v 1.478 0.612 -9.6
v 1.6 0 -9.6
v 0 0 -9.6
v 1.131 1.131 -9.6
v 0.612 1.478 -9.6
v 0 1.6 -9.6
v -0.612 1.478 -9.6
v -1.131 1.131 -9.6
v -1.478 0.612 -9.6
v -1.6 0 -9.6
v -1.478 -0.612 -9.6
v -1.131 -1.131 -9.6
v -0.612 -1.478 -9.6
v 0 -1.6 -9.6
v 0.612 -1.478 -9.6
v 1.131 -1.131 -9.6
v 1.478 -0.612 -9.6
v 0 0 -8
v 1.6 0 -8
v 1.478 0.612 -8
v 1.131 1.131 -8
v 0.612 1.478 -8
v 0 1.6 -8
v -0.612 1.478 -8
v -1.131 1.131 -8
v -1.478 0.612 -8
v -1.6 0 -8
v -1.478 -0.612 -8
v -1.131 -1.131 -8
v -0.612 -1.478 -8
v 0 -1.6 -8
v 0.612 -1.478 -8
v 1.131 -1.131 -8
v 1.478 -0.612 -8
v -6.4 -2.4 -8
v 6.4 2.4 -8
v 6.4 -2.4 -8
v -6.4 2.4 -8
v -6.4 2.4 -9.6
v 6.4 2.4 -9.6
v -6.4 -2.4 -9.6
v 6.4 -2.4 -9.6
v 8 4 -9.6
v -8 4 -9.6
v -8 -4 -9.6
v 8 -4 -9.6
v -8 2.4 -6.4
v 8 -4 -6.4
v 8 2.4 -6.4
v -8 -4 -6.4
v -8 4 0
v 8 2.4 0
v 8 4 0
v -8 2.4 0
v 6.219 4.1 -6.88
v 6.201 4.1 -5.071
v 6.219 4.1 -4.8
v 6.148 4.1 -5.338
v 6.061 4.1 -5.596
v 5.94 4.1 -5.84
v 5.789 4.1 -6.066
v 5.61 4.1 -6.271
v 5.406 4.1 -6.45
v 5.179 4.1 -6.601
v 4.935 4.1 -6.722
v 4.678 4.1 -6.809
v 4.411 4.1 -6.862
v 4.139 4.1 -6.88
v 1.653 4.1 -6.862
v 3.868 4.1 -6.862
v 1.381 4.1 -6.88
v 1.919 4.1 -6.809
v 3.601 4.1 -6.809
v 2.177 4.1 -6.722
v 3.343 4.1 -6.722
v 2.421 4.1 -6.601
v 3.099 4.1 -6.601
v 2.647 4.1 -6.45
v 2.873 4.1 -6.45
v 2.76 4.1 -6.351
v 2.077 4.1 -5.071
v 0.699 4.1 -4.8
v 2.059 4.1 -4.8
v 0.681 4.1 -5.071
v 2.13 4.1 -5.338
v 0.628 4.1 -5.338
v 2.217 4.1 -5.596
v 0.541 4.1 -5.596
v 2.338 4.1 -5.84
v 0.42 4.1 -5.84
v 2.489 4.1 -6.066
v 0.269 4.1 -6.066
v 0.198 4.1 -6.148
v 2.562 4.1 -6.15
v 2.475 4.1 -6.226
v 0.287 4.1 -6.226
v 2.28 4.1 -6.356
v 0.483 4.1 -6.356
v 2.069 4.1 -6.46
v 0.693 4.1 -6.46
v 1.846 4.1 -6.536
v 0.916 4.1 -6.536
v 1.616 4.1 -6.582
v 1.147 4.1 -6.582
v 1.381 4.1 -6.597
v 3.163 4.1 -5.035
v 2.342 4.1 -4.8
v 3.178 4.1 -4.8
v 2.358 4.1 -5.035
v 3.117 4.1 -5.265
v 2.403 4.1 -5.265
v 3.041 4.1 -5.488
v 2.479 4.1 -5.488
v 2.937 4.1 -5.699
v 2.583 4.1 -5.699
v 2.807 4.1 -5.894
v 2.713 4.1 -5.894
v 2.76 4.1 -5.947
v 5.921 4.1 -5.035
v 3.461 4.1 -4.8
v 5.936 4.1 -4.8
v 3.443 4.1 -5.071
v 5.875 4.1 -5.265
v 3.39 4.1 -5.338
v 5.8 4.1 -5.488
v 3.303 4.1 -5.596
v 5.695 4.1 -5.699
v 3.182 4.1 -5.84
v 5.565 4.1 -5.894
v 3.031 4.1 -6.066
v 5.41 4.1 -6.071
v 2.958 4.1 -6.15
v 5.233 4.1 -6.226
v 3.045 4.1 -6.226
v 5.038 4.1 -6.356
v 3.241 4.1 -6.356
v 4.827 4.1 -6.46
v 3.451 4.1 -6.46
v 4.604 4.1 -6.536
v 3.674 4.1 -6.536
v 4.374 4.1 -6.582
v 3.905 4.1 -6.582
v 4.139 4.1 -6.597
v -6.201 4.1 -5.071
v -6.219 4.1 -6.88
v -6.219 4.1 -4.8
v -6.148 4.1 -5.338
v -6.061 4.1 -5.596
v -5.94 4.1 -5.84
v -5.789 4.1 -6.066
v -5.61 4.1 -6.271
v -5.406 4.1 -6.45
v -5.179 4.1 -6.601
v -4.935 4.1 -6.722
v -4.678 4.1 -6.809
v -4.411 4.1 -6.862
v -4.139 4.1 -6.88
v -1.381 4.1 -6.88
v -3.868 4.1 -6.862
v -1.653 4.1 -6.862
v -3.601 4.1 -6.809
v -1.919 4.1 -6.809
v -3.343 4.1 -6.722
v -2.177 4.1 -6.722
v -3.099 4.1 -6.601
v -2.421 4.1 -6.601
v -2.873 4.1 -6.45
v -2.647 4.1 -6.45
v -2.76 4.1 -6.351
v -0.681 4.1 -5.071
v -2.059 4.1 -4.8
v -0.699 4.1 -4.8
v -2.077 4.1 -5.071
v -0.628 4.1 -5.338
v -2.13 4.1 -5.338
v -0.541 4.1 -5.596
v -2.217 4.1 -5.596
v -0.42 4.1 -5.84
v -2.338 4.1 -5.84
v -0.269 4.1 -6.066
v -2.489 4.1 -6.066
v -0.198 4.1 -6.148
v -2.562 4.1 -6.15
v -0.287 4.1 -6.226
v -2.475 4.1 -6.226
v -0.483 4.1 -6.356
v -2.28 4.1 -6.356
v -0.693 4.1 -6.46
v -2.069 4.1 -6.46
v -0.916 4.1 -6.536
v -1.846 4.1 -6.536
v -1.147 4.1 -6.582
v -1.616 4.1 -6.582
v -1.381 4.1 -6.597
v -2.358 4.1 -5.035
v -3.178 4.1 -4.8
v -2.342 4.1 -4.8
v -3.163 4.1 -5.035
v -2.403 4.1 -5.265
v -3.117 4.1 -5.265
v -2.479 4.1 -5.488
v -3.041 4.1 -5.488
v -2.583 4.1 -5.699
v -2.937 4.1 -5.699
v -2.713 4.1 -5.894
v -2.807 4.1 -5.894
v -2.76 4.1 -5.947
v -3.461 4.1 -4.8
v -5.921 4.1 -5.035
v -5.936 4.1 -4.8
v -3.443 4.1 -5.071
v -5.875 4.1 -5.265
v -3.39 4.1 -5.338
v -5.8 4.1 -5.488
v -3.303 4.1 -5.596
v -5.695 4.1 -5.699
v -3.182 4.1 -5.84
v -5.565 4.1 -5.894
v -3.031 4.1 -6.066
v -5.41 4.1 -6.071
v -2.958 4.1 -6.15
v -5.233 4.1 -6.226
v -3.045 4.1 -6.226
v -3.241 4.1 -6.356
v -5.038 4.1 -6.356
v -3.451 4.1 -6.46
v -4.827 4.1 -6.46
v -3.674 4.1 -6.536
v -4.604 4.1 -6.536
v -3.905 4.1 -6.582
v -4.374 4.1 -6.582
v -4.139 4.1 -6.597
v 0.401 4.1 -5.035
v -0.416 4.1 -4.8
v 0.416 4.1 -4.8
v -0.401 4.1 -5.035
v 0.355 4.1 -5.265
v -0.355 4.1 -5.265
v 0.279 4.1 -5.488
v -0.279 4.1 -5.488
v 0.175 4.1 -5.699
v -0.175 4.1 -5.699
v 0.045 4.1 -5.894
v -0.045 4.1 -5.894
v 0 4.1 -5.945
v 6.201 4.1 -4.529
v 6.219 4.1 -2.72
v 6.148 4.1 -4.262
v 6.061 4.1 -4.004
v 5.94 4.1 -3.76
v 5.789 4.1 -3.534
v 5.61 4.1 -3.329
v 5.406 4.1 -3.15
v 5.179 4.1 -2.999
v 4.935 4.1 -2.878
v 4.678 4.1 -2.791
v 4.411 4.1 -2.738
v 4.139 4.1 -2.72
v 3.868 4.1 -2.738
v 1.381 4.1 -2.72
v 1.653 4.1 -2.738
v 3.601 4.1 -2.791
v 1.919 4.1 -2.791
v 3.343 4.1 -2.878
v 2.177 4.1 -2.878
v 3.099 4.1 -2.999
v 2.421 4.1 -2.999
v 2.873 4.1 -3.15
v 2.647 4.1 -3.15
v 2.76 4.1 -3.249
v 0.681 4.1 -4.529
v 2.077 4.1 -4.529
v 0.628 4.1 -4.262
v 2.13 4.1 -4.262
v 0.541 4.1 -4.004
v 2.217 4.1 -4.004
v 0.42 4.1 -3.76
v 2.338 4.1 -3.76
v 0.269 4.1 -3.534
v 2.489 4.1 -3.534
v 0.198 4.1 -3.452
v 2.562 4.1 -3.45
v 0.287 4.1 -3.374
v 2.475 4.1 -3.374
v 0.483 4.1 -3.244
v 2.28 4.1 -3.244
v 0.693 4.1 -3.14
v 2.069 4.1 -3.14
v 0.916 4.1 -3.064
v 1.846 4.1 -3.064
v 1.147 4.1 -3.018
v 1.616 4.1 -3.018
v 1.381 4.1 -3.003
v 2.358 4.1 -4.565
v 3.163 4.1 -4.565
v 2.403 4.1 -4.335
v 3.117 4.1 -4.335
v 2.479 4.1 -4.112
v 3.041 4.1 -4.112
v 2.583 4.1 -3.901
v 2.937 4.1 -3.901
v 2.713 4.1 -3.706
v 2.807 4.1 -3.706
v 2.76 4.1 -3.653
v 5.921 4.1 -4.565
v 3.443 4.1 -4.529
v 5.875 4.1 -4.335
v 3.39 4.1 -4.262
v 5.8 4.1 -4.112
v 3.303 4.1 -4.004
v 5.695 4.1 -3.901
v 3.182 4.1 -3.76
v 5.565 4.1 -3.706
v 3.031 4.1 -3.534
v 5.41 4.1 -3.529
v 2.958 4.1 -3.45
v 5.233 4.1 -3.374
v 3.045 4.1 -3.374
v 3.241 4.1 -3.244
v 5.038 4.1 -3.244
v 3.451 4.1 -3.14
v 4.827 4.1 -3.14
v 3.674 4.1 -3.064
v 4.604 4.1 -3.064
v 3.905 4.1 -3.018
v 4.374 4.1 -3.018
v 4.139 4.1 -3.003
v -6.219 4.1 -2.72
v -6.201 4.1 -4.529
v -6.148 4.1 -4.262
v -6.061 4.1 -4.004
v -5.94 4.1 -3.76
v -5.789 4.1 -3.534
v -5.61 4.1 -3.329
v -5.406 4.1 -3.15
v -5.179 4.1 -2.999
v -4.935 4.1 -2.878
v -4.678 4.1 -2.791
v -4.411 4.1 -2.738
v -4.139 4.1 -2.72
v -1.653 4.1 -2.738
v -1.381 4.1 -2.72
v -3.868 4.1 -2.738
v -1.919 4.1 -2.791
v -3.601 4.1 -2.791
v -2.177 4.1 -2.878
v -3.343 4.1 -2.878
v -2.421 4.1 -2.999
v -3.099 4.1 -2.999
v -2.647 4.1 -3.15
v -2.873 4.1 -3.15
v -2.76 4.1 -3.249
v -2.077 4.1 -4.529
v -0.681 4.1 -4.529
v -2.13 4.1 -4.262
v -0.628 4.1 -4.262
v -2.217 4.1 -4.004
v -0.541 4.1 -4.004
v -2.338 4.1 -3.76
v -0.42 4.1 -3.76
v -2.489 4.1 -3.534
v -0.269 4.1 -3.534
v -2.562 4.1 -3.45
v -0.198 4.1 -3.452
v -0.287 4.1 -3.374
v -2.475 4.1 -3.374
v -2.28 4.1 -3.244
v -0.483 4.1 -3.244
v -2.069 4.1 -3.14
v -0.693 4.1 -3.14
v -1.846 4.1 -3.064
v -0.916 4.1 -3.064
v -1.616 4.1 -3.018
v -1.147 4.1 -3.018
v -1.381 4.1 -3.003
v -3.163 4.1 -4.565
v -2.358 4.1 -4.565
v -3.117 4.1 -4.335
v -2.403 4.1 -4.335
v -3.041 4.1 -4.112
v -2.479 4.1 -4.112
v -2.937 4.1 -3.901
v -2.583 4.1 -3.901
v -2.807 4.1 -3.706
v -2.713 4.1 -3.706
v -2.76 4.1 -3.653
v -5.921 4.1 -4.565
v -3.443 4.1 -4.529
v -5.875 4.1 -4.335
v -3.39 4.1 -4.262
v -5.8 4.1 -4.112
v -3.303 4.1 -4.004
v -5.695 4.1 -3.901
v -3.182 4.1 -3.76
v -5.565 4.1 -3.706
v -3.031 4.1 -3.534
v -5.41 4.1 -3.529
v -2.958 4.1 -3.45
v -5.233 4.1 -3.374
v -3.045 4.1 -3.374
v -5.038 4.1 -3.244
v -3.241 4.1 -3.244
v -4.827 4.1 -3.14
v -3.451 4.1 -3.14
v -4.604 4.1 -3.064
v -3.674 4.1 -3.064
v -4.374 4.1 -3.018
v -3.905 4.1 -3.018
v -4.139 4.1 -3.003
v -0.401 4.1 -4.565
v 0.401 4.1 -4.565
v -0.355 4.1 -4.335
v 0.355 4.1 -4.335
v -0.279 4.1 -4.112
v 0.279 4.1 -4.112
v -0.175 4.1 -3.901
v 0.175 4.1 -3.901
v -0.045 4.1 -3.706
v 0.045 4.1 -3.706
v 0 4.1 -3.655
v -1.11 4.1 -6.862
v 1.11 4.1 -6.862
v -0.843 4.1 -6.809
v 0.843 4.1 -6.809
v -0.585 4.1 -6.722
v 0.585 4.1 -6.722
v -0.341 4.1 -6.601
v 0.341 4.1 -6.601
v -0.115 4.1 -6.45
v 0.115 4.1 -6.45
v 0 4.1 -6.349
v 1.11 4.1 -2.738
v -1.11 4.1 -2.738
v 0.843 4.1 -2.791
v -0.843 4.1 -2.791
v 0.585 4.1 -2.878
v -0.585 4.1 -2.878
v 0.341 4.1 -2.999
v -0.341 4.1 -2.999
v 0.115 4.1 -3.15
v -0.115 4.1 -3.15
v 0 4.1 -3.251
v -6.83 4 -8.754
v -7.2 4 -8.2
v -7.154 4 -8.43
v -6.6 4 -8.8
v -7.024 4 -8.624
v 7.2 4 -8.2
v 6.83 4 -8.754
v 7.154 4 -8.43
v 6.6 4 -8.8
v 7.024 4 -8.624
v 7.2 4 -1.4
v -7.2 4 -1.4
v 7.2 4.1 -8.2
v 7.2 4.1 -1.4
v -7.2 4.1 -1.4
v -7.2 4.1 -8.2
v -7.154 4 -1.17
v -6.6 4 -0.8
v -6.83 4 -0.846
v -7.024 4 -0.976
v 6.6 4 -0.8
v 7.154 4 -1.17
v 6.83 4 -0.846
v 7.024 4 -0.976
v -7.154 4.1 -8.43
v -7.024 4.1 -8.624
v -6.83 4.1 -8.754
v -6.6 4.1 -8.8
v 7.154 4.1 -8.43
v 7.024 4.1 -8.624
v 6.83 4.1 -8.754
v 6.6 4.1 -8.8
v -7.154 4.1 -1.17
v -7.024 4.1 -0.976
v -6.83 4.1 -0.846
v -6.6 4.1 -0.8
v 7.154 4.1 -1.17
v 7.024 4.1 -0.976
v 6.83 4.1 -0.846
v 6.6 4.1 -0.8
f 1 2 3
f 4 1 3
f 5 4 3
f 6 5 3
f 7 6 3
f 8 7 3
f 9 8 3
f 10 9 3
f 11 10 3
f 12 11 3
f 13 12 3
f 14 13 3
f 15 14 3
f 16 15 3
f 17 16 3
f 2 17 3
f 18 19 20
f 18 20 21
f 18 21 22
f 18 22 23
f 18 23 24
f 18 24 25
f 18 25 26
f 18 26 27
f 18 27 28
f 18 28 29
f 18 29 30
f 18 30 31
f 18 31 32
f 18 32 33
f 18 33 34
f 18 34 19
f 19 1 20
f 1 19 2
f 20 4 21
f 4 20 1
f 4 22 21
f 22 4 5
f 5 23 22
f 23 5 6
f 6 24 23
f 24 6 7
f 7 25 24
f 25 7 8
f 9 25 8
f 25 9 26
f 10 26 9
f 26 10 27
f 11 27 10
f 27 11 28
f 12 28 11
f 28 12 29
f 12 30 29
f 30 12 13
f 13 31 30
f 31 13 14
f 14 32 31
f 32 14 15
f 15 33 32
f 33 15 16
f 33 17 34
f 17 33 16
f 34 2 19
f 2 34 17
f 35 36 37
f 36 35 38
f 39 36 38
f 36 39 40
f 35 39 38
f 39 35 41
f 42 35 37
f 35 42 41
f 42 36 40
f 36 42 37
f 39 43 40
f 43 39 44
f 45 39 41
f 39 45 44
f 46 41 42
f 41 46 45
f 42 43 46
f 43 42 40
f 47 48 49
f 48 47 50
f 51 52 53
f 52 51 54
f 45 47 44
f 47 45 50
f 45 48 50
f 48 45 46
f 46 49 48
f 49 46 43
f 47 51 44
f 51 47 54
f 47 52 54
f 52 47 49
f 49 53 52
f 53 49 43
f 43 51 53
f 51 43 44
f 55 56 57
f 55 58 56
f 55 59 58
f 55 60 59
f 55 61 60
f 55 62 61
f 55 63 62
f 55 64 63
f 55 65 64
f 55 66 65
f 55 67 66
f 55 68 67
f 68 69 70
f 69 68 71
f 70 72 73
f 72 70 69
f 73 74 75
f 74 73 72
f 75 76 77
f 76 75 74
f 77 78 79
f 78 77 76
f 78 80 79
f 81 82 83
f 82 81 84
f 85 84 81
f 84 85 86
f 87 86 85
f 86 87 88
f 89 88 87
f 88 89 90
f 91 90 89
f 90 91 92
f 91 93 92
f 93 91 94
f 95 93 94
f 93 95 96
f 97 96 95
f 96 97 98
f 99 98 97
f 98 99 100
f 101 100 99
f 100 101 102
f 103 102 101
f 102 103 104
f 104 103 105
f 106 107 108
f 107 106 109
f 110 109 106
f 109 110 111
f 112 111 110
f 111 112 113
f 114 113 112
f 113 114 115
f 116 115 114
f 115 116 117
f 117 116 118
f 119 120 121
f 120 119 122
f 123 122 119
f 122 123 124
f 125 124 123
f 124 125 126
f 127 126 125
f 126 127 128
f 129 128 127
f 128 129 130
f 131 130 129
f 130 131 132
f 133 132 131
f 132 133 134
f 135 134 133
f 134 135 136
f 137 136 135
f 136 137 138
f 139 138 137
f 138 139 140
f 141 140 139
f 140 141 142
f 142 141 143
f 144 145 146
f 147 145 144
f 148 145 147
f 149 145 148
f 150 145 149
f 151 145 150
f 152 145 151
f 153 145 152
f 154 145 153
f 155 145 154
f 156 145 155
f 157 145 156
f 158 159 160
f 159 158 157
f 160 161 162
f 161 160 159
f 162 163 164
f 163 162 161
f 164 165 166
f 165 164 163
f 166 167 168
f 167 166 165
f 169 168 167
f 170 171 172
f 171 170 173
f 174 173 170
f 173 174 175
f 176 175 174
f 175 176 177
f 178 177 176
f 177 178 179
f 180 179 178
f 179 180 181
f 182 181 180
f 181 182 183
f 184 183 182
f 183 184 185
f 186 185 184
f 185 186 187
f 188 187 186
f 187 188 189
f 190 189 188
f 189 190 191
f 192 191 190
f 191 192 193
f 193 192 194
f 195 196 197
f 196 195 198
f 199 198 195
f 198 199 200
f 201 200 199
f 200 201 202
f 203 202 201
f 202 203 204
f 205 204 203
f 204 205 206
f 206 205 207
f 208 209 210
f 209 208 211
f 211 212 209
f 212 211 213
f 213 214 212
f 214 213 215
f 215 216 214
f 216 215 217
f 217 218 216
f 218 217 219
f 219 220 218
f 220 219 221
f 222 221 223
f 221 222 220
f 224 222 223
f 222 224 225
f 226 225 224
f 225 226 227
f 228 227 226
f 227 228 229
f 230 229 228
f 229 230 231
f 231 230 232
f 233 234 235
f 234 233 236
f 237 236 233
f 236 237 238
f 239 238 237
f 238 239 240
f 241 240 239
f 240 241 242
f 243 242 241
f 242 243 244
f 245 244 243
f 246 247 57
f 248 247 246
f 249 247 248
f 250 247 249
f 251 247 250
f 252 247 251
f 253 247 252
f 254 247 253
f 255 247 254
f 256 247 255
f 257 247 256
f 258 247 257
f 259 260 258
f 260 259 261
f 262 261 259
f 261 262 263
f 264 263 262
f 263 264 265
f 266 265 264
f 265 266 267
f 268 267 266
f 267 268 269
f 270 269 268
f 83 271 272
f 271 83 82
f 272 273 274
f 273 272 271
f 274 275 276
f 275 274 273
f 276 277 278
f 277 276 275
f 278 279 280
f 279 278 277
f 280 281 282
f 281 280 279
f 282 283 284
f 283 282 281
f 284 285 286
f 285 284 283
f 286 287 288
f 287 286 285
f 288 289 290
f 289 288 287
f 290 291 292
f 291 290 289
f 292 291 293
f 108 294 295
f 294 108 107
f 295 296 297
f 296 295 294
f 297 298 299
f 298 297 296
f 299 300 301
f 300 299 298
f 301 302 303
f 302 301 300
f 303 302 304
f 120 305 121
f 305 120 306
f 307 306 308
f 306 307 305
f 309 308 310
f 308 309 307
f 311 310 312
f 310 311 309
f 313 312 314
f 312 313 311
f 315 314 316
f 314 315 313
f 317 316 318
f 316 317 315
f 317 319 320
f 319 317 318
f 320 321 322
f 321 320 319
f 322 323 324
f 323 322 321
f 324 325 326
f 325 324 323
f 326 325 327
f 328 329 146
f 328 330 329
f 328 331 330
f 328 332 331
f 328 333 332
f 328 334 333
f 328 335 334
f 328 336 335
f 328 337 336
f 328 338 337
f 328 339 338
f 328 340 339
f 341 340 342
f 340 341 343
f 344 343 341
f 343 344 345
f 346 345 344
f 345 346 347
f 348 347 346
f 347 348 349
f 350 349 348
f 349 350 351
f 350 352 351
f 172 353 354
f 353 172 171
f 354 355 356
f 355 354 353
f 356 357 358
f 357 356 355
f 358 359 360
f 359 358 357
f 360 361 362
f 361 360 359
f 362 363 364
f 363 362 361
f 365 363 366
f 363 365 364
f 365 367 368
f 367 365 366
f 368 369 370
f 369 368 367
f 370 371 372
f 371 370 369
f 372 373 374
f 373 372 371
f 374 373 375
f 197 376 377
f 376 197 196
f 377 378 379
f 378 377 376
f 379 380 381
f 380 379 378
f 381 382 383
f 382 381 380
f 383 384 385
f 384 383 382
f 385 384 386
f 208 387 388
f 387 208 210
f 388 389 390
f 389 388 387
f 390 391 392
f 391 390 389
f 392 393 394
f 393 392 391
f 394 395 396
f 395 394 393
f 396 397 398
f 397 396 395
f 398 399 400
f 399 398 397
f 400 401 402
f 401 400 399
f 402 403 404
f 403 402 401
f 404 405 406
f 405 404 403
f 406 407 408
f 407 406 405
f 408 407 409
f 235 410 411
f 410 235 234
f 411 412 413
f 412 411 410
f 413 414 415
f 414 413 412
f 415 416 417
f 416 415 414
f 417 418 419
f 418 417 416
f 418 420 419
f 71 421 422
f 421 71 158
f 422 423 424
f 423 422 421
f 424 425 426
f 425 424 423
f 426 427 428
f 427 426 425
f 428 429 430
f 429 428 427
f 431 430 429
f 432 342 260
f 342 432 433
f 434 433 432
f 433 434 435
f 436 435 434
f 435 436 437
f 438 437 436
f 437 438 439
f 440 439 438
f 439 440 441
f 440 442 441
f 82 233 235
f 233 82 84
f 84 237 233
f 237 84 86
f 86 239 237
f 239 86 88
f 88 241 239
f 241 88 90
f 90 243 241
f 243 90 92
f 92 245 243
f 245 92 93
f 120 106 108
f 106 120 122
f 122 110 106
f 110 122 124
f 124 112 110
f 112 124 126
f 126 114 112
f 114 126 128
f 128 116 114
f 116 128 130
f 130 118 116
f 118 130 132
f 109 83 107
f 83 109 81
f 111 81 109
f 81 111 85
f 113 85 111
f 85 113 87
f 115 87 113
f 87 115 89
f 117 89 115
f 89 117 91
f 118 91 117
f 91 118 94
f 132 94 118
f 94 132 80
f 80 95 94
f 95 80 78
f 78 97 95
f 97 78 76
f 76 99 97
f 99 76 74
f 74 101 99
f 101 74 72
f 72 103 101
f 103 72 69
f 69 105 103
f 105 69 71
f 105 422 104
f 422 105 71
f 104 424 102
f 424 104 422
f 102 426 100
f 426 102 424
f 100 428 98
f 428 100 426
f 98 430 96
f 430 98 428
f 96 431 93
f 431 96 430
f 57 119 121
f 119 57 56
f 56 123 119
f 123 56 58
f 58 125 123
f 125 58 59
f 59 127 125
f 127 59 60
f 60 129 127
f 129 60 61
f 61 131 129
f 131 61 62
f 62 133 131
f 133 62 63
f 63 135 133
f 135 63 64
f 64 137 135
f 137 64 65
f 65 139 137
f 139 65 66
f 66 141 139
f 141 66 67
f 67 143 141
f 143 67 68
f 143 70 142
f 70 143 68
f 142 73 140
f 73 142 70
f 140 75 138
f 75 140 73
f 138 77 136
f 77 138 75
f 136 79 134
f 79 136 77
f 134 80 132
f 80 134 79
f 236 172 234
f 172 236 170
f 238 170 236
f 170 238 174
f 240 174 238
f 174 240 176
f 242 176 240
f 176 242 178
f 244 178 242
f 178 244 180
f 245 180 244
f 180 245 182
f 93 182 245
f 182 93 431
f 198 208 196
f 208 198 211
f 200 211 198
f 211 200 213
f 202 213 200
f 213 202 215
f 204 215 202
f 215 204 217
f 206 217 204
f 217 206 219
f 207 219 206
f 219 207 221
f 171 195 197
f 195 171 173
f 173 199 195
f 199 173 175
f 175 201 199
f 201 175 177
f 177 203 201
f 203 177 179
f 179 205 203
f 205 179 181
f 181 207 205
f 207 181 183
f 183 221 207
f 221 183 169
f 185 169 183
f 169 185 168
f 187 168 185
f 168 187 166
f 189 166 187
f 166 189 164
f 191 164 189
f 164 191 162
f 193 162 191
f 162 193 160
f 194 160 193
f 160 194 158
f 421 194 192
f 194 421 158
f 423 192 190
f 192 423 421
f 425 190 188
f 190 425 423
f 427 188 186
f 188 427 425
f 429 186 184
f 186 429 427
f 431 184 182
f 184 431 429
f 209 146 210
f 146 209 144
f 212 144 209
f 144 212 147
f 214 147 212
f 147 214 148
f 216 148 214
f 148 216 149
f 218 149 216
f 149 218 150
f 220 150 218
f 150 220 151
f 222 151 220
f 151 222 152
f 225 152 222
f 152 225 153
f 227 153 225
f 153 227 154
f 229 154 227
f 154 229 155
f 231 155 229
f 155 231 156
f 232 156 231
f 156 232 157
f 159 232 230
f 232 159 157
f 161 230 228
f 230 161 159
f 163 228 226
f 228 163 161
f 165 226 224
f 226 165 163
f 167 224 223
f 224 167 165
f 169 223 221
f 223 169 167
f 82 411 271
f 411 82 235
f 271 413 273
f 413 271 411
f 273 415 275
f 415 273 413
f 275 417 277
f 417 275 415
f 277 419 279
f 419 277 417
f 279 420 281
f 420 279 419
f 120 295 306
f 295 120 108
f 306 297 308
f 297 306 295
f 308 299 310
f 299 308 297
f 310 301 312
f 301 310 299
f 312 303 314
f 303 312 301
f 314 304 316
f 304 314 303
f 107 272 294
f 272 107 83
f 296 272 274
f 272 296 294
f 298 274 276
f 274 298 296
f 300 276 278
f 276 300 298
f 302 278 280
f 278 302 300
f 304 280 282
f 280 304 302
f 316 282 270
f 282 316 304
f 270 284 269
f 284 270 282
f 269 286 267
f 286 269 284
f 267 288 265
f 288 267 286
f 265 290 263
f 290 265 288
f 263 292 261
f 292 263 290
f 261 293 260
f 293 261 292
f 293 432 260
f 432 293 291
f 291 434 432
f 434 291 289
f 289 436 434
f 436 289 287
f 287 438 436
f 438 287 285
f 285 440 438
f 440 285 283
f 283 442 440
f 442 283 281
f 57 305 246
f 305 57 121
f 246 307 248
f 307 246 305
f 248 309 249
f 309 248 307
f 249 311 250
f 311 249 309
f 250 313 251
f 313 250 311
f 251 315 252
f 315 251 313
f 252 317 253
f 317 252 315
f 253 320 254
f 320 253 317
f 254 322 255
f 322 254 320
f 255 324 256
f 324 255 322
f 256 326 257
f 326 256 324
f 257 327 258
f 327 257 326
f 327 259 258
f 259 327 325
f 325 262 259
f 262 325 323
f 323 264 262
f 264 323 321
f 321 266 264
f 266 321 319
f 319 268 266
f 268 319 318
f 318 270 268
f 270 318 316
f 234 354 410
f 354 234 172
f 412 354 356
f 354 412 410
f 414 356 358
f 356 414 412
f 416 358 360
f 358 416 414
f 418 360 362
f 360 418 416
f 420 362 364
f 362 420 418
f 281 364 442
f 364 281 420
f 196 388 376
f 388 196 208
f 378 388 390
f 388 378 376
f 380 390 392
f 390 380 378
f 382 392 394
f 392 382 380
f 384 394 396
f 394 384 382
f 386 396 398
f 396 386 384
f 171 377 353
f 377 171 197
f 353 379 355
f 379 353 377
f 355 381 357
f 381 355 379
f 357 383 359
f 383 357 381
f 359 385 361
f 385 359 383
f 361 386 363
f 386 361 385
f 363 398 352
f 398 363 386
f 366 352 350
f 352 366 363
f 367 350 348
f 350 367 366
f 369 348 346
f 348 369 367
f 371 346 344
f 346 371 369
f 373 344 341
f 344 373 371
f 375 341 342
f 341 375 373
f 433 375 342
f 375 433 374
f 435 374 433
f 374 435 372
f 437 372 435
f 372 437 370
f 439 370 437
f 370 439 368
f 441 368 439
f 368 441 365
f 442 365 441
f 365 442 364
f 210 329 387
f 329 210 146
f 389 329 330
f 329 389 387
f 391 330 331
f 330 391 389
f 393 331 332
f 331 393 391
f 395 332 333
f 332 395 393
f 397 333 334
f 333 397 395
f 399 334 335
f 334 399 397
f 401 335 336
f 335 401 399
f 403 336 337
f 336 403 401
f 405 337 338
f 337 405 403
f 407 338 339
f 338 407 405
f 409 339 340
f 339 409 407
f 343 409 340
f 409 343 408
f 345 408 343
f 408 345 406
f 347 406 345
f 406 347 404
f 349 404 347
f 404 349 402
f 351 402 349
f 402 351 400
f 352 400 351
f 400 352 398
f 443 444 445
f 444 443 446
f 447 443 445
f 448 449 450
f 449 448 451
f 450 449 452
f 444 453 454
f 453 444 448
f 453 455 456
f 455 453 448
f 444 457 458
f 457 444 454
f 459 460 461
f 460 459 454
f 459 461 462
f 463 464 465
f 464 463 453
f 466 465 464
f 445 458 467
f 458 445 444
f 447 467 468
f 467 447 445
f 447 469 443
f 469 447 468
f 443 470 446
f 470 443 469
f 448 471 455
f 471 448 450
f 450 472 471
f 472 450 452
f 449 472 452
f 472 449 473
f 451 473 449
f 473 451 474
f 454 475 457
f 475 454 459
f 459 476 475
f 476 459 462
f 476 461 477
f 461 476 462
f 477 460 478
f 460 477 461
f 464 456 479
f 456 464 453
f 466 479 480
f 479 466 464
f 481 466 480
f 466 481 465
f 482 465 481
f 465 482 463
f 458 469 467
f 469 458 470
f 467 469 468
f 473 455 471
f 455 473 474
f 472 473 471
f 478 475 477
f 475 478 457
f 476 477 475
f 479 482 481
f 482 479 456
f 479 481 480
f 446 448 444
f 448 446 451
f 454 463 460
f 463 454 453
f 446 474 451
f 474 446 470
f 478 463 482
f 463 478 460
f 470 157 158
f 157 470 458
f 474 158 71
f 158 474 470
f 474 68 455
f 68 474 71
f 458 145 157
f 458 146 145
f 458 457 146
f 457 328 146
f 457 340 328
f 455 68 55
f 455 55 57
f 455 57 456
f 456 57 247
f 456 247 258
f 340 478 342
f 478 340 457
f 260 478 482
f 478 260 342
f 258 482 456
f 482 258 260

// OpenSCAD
use <../lib.scad>
use <4865a.scad>
use <6142271g.scad>
function ldraw_lib__4865ad0c() = [
// 0 Panel  1 x  2 x  1 with White Audi Logo on Red Background Sticker
// 0 Name: 4865ad0c.dat
// 0 Author: Vincent Messenet [Cheenzo]
// 0 !LDRAW_ORG Shortcut UPDATE 2025-03
// 0 !LICENSE Licensed under CC BY 4.0 : see CAreadme.txt
// 
// 0 BFC CERTIFY CCW
  [0,"BFC","CERTIFY"],
  [0,"BFC","CCW"],
// 
// 0 !CATEGORY Sticker Shortcut
// 0 !KEYWORDS Audi R8 LMS ultra, Bricklink 4865pb068, Set 75873
// 
// 0 !PREVIEW 16 0 0 0 -1 0 0 0 1 0 0 0 -1
// 
// 0 !HISTORY 2025-03-30 [OrionP] Official Update 2025-03
// 
// 1 16 0 0 0 1 0 0 0 1 0 0 0 1 4865a.dat
  [1,16,0,0,0,1,0,0,0,1,0,0,0,1, ldraw_lib__4865a()],
// 1 16 0 12 10 1 0 0 0 0 1 0 -1 0 6142271g.dat
  [1,16,0,12,10,1,0,0,0,0,1,0,-1,0, ldraw_lib__6142271g()],
];
module ldraw_lib__4865ad0c(step=0, col=false, unit=2/5, alt=false, line=0.2, solid=!$preview)
    makepoly(ldraw_lib__4865ad0c(), step=step, col=col, unit=unit, alt=alt, line=line, solid=solid);
ldraw_lib__4865ad0c(line=0.2);
